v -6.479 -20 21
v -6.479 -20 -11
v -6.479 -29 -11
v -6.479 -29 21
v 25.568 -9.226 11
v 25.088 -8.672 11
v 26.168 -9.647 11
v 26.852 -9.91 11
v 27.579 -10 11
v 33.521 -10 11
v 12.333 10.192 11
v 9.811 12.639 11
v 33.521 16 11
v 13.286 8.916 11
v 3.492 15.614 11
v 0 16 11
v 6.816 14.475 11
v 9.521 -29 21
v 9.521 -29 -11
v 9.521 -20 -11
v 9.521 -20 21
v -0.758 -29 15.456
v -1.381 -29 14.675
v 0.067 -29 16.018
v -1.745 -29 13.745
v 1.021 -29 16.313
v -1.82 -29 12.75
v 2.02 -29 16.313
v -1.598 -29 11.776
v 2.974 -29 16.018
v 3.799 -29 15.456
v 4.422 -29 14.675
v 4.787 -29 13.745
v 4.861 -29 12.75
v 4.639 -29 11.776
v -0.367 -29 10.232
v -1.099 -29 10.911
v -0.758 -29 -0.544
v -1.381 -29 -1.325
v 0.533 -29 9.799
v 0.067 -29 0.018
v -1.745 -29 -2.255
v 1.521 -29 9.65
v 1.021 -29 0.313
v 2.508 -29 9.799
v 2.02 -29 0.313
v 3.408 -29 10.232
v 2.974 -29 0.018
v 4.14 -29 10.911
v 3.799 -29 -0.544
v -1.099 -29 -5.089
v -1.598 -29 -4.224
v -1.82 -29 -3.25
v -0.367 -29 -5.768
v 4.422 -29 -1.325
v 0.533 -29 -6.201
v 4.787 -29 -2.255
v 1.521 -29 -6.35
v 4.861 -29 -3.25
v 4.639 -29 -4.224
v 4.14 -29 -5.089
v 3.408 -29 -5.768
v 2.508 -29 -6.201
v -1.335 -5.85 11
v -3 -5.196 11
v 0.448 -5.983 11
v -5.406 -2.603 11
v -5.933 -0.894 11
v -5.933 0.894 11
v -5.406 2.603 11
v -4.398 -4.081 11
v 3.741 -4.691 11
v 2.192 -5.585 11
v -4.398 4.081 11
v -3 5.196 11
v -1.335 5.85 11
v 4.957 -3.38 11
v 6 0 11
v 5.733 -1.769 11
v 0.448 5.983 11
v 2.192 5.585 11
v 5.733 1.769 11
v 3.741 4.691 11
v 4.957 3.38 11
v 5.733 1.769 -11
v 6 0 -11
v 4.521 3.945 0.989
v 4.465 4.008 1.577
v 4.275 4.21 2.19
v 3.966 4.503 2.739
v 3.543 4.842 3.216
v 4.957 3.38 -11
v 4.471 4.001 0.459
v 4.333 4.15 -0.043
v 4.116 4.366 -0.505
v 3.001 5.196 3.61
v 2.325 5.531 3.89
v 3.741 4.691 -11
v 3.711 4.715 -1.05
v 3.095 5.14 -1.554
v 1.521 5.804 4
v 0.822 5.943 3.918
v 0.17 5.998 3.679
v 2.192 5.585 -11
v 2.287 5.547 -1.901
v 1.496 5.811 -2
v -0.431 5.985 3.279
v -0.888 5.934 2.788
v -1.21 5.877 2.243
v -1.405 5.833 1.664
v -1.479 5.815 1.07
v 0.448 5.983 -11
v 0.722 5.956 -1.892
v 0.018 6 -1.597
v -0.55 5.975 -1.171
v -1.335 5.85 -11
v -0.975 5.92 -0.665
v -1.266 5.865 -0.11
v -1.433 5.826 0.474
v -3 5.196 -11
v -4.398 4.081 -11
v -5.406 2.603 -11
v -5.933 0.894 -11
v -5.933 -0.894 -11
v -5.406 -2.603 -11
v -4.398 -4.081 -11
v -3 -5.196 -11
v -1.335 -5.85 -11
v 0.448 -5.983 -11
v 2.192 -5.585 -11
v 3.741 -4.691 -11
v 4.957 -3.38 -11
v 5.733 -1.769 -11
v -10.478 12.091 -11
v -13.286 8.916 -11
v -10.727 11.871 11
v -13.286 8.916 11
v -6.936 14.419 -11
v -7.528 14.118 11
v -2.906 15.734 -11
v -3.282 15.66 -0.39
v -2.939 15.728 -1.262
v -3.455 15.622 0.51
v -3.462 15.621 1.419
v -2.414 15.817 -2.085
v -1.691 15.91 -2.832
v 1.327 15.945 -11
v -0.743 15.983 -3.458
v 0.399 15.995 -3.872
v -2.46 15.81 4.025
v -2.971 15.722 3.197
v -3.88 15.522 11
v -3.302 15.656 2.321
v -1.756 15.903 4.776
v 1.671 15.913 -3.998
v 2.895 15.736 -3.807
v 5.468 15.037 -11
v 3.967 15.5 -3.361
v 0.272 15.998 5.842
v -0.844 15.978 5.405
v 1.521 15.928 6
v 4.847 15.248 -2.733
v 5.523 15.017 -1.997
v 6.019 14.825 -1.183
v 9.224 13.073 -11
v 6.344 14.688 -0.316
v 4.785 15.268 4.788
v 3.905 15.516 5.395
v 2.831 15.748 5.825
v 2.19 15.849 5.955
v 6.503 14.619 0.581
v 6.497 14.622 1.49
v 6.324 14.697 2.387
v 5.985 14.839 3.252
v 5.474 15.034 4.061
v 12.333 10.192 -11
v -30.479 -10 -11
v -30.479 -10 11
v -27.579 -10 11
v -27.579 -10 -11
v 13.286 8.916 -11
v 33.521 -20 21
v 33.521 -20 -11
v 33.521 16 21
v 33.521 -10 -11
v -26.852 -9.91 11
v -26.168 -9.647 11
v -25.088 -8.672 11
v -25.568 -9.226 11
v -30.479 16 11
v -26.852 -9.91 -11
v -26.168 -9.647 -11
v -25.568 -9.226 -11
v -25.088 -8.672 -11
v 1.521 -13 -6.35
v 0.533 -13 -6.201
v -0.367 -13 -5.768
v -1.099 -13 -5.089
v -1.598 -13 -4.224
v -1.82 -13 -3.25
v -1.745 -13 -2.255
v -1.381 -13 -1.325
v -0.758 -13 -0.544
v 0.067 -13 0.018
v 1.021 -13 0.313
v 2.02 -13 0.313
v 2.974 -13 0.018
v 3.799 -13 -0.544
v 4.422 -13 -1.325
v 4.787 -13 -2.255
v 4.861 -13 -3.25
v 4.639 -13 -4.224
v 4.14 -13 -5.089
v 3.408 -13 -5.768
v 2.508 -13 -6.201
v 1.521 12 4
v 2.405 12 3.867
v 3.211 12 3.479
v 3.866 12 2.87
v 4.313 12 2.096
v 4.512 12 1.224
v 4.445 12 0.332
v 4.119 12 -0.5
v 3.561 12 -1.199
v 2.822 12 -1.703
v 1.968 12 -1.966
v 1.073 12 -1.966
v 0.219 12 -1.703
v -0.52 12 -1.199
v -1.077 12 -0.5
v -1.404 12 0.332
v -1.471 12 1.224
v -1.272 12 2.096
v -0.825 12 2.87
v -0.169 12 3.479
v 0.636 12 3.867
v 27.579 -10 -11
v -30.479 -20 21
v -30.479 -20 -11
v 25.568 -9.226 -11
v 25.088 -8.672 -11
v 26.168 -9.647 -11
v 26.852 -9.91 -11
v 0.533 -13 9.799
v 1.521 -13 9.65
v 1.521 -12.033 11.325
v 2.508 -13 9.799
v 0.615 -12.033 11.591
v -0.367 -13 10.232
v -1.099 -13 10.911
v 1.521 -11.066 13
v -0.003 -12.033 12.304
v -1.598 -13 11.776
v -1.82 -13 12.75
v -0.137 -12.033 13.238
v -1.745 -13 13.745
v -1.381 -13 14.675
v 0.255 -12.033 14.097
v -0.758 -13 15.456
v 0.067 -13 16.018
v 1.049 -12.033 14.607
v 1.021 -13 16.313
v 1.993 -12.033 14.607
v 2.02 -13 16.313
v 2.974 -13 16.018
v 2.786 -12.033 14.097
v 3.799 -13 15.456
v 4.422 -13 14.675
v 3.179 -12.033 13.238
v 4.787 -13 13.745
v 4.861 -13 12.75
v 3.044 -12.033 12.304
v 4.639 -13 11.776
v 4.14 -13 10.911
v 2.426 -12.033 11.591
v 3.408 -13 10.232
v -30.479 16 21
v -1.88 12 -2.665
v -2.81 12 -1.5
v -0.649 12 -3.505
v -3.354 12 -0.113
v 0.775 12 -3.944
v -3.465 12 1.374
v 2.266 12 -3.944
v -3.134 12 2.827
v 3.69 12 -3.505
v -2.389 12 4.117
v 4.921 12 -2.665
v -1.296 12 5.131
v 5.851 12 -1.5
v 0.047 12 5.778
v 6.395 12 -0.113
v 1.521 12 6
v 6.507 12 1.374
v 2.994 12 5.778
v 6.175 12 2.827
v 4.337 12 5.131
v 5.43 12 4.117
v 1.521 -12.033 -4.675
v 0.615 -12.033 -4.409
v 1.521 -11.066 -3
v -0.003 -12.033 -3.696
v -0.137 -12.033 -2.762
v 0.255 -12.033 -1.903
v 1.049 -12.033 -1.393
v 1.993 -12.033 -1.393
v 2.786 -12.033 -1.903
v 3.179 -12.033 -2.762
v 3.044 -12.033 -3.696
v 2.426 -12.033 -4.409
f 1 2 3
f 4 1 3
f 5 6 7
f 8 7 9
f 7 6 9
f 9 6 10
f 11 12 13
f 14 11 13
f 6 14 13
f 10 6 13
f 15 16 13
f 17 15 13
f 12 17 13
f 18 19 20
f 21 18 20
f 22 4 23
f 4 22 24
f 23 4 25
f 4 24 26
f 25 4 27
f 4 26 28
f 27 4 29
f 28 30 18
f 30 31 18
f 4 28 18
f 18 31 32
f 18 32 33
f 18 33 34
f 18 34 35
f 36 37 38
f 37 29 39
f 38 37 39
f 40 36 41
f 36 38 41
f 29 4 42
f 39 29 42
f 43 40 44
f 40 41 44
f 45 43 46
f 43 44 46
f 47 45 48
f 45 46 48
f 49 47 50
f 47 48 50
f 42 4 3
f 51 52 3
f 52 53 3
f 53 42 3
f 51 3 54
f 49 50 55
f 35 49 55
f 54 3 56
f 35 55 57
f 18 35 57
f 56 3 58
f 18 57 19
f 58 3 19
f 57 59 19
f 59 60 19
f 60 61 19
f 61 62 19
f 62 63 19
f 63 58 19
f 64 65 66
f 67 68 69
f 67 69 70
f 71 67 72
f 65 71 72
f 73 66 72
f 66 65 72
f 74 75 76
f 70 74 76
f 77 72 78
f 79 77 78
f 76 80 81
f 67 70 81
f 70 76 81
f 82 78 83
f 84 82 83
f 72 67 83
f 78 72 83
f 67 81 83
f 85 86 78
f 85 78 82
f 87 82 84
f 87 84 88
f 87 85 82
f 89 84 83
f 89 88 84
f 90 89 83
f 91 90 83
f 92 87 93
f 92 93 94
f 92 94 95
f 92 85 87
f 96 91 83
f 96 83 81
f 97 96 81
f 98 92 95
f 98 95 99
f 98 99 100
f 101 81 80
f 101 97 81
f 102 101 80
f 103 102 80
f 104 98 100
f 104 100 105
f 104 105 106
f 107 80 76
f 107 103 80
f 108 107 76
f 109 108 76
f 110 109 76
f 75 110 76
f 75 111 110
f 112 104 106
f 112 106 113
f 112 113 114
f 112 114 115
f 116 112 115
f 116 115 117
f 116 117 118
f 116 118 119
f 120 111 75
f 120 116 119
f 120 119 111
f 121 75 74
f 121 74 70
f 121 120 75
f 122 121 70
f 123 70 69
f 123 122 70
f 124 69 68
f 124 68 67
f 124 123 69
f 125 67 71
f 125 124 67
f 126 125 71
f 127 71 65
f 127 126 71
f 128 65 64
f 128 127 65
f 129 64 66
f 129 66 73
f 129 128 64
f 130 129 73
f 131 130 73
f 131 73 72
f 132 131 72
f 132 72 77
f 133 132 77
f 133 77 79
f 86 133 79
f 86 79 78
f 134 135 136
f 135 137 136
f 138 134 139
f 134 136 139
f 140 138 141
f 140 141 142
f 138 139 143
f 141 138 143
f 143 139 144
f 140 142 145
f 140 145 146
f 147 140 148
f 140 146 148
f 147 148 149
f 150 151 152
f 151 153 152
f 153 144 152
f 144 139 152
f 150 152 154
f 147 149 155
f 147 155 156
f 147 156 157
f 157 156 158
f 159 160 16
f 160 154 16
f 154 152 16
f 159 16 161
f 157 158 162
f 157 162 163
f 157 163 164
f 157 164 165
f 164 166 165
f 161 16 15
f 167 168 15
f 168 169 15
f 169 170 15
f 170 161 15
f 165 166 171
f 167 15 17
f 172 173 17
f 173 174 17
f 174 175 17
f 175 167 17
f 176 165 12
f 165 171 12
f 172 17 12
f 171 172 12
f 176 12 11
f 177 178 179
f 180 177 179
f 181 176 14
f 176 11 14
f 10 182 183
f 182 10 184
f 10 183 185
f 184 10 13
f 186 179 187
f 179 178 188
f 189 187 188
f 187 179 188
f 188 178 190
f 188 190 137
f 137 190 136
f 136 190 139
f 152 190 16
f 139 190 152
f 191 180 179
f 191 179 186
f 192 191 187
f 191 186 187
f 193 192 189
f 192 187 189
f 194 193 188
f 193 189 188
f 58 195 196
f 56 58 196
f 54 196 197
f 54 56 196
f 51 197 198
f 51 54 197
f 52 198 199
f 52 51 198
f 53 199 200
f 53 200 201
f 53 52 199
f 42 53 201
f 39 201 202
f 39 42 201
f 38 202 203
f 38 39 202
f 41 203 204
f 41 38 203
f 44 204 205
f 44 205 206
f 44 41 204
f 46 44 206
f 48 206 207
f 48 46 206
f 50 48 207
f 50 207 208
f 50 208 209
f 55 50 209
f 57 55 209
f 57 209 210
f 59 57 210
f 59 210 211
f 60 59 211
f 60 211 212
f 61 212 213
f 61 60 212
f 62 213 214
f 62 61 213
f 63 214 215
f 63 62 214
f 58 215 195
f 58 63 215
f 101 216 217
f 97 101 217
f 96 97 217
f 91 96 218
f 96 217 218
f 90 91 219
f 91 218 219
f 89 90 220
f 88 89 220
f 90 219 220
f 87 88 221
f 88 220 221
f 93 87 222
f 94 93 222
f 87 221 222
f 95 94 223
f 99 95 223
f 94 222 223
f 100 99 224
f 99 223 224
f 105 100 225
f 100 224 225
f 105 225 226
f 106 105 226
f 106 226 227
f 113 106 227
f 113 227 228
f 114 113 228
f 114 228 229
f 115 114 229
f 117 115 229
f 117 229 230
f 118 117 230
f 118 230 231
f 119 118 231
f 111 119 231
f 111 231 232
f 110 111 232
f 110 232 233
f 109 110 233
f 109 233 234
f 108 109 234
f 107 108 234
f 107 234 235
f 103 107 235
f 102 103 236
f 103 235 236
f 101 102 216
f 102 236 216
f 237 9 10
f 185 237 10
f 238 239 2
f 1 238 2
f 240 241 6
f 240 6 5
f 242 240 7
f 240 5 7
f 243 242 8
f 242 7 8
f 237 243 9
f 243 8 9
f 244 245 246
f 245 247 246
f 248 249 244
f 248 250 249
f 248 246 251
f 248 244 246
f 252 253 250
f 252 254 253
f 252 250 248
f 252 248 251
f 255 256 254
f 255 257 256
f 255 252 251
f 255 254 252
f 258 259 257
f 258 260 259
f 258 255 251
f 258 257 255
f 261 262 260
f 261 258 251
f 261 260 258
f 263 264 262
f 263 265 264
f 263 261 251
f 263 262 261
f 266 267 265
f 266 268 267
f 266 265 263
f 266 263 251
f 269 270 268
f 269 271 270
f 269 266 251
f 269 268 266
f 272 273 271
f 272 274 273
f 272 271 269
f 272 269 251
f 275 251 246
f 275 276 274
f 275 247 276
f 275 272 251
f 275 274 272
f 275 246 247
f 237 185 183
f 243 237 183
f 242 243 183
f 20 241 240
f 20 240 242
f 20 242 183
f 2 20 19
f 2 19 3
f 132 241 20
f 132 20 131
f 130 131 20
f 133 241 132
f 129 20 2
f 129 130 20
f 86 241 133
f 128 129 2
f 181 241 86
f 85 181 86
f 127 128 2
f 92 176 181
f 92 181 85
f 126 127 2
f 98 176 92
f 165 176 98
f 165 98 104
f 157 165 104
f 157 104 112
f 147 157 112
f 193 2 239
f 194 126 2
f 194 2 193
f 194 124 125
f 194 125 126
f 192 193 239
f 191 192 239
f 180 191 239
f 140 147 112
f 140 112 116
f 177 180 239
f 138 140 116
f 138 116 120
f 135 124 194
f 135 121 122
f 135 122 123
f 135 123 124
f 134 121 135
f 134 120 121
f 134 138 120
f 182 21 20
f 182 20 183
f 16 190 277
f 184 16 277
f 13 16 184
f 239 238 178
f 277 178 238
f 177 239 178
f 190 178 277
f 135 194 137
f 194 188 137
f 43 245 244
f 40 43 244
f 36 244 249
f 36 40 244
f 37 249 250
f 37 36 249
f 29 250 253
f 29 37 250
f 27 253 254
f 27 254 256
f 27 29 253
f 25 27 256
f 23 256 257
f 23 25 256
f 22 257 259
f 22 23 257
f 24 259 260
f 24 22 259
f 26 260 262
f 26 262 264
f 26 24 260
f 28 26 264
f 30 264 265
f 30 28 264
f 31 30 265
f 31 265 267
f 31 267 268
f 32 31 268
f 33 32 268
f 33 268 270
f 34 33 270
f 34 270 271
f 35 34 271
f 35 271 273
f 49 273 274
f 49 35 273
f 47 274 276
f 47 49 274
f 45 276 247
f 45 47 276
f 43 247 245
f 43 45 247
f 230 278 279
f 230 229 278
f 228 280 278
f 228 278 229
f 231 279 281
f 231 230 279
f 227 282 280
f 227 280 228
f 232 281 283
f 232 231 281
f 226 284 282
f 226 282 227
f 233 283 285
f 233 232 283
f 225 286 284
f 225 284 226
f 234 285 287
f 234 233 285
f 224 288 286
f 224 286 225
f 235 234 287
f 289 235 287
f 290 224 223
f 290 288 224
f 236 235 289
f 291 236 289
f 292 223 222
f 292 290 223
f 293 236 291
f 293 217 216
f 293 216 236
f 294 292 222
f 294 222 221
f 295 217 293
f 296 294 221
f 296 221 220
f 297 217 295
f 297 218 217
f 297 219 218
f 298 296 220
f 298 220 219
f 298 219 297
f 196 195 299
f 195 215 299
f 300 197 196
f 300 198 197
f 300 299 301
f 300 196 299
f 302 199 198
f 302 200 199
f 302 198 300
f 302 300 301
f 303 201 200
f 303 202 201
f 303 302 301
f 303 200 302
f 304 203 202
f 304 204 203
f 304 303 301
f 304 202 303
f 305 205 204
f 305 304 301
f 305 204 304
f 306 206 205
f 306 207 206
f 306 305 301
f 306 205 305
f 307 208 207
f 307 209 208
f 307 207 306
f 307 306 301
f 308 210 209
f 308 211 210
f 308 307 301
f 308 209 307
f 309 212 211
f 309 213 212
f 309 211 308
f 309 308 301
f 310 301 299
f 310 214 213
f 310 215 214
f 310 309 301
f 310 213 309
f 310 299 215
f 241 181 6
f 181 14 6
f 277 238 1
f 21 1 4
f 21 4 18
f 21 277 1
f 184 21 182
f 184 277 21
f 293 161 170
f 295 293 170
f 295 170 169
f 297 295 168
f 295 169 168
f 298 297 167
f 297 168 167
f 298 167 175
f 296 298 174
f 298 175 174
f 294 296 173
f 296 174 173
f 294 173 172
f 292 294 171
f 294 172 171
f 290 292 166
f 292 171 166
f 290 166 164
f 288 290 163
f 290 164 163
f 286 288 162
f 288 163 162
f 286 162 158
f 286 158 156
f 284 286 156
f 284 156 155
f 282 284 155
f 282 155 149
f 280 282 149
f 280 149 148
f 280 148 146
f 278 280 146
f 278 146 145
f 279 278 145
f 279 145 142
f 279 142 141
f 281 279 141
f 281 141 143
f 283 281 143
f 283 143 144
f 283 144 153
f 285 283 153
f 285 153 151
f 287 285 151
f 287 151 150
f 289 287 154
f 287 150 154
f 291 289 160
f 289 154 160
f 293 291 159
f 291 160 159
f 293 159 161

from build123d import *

# Parameters (mm, degrees)
SKETCH2_R           = 6
BOSS_EXTRUDE1_DEPTH = 11
SKETCH3_W           = 64
SKETCH3_H           = 36
BOSS_EXTRUDE2_DEPTH = 10
BOSS_EXTRUDE3_DEPTH = 32
SKETCH5_R           = 5
CUT_EXTRUDE5_DEPTH  = 4
SKETCH7_R           = 3
CUT_EXTRUDE6_DEPTH  = 10


with BuildPart() as part:
    # Sketch2 → Boss-Extrude1 (new, symmetric)
    with BuildSketch(Plane.XY):
        with BuildLine():
            Line((-30.479384134, -10), (-27.579076202, -10))
            ThreePointArc((-27.579076202, -10), (-26.167523045, -9.647171639), (-25.087993879, -8.671678457))
            Line((-25.087993879, -8.671678457), (-13.285772387, 8.915618436))
            ThreePointArc((-13.285772387, 8.915618436), (-0.796428366, 15.98016589), (12.333454196, 10.192443652))
            Line((12.333454196, 10.192443652), (13.285772387, 8.915618436))
            Line((13.285772387, 8.915618436), (25.087993879, -8.671678457))
            ThreePointArc((25.087993879, -8.671678457), (26.167523045, -9.647171639), (27.579076202, -10))
            Line((27.579076202, -10), (30.479384134, -10))
            Line((30.479384134, -10), (31.075959419, -10))
            Line((31.075959419, -10), (33.520615866, -10))
            Line((33.520615866, -10), (33.520615866, -20))
            Line((33.520615866, -20), (-30.479384134, -20))
            Line((-30.479384134, -20), (-30.479384134, -10))
        make_face()
        Circle(SKETCH2_R, mode=Mode.SUBTRACT)
    extrude(amount=BOSS_EXTRUDE1_DEPTH, both=True)

    # Sketch3 → Boss-Extrude2 (add)
    with BuildSketch(Plane.XY.offset(11)):
        with Locations((1.520615866, -2)):
            Rectangle(SKETCH3_W, SKETCH3_H)
    extrude(amount=BOSS_EXTRUDE2_DEPTH)

    # Sketch4 → Boss-Extrude3 (add)
    with BuildSketch(Plane(origin=(0, 0, -11), x_dir=(-1, 0, 0), z_dir=(0, 0, -1))):
        Polygon((-1.520615866, -20), (6.479384134, -20), (6.479384134, -29), (-9.520615866, -29), (-9.520615866, -20), align=None)
    extrude(amount=-BOSS_EXTRUDE3_DEPTH)

    # Sketch5 → Cut-Extrude5 (cut)
    with BuildSketch(Plane(origin=(0, 16, 0), x_dir=(1, 0, 0), z_dir=(0, 1, 0))):
        with Locations(Location((1.520615866, -1, 0), (0, 0, 270))):
            Circle(SKETCH5_R)
    extrude(amount=-CUT_EXTRUDE5_DEPTH, mode=Mode.SUBTRACT)

    # Sketch7 → Cut-Extrude6 (cut)
    with BuildSketch(Plane(origin=(0, 12, 0), x_dir=(1, 0, 0), z_dir=(0, 1, 0))):
        with Locations(Location((1.520615866, -1, 0), (0, 0, 270))):
            Circle(SKETCH7_R)
    extrude(amount=-CUT_EXTRUDE6_DEPTH, mode=Mode.SUBTRACT)

    # Sketch11 → Cut-Revolve1 (revolve, cut)
    with BuildSketch(Plane(origin=(1.520615866, 0, 0), x_dir=(0, 0, -1), z_dir=(1, 0, 0))):
        Polygon((3, -29), (3, -13), (3, -11.065876598), (6.35, -13), (6.35, -29), align=None)
    revolve(axis=Axis((1.520615866, -13, -3), (0, 1, 0)), mode=Mode.SUBTRACT)

    # Sketch14 → Cut-Revolve2 (revolve, cut)
    with BuildSketch(Plane(origin=(1.520615866, 0, 0), x_dir=(0, 0, -1), z_dir=(1, 0, 0)), mode=Mode.PRIVATE) as cut_revolve2_sk:
        Polygon((-16.35, -29), (-13, -29), (-13, -11.065876598), (-16.35, -13), align=None)
    revolve(cut_revolve2_sk.sketch.rotate(Axis((1.520615866, -29, 13), (0, 1, 0)), 180), axis=Axis((1.520615866, -29, 13), (0, 1, 0)), mode=Mode.SUBTRACT)


solid = part.part
